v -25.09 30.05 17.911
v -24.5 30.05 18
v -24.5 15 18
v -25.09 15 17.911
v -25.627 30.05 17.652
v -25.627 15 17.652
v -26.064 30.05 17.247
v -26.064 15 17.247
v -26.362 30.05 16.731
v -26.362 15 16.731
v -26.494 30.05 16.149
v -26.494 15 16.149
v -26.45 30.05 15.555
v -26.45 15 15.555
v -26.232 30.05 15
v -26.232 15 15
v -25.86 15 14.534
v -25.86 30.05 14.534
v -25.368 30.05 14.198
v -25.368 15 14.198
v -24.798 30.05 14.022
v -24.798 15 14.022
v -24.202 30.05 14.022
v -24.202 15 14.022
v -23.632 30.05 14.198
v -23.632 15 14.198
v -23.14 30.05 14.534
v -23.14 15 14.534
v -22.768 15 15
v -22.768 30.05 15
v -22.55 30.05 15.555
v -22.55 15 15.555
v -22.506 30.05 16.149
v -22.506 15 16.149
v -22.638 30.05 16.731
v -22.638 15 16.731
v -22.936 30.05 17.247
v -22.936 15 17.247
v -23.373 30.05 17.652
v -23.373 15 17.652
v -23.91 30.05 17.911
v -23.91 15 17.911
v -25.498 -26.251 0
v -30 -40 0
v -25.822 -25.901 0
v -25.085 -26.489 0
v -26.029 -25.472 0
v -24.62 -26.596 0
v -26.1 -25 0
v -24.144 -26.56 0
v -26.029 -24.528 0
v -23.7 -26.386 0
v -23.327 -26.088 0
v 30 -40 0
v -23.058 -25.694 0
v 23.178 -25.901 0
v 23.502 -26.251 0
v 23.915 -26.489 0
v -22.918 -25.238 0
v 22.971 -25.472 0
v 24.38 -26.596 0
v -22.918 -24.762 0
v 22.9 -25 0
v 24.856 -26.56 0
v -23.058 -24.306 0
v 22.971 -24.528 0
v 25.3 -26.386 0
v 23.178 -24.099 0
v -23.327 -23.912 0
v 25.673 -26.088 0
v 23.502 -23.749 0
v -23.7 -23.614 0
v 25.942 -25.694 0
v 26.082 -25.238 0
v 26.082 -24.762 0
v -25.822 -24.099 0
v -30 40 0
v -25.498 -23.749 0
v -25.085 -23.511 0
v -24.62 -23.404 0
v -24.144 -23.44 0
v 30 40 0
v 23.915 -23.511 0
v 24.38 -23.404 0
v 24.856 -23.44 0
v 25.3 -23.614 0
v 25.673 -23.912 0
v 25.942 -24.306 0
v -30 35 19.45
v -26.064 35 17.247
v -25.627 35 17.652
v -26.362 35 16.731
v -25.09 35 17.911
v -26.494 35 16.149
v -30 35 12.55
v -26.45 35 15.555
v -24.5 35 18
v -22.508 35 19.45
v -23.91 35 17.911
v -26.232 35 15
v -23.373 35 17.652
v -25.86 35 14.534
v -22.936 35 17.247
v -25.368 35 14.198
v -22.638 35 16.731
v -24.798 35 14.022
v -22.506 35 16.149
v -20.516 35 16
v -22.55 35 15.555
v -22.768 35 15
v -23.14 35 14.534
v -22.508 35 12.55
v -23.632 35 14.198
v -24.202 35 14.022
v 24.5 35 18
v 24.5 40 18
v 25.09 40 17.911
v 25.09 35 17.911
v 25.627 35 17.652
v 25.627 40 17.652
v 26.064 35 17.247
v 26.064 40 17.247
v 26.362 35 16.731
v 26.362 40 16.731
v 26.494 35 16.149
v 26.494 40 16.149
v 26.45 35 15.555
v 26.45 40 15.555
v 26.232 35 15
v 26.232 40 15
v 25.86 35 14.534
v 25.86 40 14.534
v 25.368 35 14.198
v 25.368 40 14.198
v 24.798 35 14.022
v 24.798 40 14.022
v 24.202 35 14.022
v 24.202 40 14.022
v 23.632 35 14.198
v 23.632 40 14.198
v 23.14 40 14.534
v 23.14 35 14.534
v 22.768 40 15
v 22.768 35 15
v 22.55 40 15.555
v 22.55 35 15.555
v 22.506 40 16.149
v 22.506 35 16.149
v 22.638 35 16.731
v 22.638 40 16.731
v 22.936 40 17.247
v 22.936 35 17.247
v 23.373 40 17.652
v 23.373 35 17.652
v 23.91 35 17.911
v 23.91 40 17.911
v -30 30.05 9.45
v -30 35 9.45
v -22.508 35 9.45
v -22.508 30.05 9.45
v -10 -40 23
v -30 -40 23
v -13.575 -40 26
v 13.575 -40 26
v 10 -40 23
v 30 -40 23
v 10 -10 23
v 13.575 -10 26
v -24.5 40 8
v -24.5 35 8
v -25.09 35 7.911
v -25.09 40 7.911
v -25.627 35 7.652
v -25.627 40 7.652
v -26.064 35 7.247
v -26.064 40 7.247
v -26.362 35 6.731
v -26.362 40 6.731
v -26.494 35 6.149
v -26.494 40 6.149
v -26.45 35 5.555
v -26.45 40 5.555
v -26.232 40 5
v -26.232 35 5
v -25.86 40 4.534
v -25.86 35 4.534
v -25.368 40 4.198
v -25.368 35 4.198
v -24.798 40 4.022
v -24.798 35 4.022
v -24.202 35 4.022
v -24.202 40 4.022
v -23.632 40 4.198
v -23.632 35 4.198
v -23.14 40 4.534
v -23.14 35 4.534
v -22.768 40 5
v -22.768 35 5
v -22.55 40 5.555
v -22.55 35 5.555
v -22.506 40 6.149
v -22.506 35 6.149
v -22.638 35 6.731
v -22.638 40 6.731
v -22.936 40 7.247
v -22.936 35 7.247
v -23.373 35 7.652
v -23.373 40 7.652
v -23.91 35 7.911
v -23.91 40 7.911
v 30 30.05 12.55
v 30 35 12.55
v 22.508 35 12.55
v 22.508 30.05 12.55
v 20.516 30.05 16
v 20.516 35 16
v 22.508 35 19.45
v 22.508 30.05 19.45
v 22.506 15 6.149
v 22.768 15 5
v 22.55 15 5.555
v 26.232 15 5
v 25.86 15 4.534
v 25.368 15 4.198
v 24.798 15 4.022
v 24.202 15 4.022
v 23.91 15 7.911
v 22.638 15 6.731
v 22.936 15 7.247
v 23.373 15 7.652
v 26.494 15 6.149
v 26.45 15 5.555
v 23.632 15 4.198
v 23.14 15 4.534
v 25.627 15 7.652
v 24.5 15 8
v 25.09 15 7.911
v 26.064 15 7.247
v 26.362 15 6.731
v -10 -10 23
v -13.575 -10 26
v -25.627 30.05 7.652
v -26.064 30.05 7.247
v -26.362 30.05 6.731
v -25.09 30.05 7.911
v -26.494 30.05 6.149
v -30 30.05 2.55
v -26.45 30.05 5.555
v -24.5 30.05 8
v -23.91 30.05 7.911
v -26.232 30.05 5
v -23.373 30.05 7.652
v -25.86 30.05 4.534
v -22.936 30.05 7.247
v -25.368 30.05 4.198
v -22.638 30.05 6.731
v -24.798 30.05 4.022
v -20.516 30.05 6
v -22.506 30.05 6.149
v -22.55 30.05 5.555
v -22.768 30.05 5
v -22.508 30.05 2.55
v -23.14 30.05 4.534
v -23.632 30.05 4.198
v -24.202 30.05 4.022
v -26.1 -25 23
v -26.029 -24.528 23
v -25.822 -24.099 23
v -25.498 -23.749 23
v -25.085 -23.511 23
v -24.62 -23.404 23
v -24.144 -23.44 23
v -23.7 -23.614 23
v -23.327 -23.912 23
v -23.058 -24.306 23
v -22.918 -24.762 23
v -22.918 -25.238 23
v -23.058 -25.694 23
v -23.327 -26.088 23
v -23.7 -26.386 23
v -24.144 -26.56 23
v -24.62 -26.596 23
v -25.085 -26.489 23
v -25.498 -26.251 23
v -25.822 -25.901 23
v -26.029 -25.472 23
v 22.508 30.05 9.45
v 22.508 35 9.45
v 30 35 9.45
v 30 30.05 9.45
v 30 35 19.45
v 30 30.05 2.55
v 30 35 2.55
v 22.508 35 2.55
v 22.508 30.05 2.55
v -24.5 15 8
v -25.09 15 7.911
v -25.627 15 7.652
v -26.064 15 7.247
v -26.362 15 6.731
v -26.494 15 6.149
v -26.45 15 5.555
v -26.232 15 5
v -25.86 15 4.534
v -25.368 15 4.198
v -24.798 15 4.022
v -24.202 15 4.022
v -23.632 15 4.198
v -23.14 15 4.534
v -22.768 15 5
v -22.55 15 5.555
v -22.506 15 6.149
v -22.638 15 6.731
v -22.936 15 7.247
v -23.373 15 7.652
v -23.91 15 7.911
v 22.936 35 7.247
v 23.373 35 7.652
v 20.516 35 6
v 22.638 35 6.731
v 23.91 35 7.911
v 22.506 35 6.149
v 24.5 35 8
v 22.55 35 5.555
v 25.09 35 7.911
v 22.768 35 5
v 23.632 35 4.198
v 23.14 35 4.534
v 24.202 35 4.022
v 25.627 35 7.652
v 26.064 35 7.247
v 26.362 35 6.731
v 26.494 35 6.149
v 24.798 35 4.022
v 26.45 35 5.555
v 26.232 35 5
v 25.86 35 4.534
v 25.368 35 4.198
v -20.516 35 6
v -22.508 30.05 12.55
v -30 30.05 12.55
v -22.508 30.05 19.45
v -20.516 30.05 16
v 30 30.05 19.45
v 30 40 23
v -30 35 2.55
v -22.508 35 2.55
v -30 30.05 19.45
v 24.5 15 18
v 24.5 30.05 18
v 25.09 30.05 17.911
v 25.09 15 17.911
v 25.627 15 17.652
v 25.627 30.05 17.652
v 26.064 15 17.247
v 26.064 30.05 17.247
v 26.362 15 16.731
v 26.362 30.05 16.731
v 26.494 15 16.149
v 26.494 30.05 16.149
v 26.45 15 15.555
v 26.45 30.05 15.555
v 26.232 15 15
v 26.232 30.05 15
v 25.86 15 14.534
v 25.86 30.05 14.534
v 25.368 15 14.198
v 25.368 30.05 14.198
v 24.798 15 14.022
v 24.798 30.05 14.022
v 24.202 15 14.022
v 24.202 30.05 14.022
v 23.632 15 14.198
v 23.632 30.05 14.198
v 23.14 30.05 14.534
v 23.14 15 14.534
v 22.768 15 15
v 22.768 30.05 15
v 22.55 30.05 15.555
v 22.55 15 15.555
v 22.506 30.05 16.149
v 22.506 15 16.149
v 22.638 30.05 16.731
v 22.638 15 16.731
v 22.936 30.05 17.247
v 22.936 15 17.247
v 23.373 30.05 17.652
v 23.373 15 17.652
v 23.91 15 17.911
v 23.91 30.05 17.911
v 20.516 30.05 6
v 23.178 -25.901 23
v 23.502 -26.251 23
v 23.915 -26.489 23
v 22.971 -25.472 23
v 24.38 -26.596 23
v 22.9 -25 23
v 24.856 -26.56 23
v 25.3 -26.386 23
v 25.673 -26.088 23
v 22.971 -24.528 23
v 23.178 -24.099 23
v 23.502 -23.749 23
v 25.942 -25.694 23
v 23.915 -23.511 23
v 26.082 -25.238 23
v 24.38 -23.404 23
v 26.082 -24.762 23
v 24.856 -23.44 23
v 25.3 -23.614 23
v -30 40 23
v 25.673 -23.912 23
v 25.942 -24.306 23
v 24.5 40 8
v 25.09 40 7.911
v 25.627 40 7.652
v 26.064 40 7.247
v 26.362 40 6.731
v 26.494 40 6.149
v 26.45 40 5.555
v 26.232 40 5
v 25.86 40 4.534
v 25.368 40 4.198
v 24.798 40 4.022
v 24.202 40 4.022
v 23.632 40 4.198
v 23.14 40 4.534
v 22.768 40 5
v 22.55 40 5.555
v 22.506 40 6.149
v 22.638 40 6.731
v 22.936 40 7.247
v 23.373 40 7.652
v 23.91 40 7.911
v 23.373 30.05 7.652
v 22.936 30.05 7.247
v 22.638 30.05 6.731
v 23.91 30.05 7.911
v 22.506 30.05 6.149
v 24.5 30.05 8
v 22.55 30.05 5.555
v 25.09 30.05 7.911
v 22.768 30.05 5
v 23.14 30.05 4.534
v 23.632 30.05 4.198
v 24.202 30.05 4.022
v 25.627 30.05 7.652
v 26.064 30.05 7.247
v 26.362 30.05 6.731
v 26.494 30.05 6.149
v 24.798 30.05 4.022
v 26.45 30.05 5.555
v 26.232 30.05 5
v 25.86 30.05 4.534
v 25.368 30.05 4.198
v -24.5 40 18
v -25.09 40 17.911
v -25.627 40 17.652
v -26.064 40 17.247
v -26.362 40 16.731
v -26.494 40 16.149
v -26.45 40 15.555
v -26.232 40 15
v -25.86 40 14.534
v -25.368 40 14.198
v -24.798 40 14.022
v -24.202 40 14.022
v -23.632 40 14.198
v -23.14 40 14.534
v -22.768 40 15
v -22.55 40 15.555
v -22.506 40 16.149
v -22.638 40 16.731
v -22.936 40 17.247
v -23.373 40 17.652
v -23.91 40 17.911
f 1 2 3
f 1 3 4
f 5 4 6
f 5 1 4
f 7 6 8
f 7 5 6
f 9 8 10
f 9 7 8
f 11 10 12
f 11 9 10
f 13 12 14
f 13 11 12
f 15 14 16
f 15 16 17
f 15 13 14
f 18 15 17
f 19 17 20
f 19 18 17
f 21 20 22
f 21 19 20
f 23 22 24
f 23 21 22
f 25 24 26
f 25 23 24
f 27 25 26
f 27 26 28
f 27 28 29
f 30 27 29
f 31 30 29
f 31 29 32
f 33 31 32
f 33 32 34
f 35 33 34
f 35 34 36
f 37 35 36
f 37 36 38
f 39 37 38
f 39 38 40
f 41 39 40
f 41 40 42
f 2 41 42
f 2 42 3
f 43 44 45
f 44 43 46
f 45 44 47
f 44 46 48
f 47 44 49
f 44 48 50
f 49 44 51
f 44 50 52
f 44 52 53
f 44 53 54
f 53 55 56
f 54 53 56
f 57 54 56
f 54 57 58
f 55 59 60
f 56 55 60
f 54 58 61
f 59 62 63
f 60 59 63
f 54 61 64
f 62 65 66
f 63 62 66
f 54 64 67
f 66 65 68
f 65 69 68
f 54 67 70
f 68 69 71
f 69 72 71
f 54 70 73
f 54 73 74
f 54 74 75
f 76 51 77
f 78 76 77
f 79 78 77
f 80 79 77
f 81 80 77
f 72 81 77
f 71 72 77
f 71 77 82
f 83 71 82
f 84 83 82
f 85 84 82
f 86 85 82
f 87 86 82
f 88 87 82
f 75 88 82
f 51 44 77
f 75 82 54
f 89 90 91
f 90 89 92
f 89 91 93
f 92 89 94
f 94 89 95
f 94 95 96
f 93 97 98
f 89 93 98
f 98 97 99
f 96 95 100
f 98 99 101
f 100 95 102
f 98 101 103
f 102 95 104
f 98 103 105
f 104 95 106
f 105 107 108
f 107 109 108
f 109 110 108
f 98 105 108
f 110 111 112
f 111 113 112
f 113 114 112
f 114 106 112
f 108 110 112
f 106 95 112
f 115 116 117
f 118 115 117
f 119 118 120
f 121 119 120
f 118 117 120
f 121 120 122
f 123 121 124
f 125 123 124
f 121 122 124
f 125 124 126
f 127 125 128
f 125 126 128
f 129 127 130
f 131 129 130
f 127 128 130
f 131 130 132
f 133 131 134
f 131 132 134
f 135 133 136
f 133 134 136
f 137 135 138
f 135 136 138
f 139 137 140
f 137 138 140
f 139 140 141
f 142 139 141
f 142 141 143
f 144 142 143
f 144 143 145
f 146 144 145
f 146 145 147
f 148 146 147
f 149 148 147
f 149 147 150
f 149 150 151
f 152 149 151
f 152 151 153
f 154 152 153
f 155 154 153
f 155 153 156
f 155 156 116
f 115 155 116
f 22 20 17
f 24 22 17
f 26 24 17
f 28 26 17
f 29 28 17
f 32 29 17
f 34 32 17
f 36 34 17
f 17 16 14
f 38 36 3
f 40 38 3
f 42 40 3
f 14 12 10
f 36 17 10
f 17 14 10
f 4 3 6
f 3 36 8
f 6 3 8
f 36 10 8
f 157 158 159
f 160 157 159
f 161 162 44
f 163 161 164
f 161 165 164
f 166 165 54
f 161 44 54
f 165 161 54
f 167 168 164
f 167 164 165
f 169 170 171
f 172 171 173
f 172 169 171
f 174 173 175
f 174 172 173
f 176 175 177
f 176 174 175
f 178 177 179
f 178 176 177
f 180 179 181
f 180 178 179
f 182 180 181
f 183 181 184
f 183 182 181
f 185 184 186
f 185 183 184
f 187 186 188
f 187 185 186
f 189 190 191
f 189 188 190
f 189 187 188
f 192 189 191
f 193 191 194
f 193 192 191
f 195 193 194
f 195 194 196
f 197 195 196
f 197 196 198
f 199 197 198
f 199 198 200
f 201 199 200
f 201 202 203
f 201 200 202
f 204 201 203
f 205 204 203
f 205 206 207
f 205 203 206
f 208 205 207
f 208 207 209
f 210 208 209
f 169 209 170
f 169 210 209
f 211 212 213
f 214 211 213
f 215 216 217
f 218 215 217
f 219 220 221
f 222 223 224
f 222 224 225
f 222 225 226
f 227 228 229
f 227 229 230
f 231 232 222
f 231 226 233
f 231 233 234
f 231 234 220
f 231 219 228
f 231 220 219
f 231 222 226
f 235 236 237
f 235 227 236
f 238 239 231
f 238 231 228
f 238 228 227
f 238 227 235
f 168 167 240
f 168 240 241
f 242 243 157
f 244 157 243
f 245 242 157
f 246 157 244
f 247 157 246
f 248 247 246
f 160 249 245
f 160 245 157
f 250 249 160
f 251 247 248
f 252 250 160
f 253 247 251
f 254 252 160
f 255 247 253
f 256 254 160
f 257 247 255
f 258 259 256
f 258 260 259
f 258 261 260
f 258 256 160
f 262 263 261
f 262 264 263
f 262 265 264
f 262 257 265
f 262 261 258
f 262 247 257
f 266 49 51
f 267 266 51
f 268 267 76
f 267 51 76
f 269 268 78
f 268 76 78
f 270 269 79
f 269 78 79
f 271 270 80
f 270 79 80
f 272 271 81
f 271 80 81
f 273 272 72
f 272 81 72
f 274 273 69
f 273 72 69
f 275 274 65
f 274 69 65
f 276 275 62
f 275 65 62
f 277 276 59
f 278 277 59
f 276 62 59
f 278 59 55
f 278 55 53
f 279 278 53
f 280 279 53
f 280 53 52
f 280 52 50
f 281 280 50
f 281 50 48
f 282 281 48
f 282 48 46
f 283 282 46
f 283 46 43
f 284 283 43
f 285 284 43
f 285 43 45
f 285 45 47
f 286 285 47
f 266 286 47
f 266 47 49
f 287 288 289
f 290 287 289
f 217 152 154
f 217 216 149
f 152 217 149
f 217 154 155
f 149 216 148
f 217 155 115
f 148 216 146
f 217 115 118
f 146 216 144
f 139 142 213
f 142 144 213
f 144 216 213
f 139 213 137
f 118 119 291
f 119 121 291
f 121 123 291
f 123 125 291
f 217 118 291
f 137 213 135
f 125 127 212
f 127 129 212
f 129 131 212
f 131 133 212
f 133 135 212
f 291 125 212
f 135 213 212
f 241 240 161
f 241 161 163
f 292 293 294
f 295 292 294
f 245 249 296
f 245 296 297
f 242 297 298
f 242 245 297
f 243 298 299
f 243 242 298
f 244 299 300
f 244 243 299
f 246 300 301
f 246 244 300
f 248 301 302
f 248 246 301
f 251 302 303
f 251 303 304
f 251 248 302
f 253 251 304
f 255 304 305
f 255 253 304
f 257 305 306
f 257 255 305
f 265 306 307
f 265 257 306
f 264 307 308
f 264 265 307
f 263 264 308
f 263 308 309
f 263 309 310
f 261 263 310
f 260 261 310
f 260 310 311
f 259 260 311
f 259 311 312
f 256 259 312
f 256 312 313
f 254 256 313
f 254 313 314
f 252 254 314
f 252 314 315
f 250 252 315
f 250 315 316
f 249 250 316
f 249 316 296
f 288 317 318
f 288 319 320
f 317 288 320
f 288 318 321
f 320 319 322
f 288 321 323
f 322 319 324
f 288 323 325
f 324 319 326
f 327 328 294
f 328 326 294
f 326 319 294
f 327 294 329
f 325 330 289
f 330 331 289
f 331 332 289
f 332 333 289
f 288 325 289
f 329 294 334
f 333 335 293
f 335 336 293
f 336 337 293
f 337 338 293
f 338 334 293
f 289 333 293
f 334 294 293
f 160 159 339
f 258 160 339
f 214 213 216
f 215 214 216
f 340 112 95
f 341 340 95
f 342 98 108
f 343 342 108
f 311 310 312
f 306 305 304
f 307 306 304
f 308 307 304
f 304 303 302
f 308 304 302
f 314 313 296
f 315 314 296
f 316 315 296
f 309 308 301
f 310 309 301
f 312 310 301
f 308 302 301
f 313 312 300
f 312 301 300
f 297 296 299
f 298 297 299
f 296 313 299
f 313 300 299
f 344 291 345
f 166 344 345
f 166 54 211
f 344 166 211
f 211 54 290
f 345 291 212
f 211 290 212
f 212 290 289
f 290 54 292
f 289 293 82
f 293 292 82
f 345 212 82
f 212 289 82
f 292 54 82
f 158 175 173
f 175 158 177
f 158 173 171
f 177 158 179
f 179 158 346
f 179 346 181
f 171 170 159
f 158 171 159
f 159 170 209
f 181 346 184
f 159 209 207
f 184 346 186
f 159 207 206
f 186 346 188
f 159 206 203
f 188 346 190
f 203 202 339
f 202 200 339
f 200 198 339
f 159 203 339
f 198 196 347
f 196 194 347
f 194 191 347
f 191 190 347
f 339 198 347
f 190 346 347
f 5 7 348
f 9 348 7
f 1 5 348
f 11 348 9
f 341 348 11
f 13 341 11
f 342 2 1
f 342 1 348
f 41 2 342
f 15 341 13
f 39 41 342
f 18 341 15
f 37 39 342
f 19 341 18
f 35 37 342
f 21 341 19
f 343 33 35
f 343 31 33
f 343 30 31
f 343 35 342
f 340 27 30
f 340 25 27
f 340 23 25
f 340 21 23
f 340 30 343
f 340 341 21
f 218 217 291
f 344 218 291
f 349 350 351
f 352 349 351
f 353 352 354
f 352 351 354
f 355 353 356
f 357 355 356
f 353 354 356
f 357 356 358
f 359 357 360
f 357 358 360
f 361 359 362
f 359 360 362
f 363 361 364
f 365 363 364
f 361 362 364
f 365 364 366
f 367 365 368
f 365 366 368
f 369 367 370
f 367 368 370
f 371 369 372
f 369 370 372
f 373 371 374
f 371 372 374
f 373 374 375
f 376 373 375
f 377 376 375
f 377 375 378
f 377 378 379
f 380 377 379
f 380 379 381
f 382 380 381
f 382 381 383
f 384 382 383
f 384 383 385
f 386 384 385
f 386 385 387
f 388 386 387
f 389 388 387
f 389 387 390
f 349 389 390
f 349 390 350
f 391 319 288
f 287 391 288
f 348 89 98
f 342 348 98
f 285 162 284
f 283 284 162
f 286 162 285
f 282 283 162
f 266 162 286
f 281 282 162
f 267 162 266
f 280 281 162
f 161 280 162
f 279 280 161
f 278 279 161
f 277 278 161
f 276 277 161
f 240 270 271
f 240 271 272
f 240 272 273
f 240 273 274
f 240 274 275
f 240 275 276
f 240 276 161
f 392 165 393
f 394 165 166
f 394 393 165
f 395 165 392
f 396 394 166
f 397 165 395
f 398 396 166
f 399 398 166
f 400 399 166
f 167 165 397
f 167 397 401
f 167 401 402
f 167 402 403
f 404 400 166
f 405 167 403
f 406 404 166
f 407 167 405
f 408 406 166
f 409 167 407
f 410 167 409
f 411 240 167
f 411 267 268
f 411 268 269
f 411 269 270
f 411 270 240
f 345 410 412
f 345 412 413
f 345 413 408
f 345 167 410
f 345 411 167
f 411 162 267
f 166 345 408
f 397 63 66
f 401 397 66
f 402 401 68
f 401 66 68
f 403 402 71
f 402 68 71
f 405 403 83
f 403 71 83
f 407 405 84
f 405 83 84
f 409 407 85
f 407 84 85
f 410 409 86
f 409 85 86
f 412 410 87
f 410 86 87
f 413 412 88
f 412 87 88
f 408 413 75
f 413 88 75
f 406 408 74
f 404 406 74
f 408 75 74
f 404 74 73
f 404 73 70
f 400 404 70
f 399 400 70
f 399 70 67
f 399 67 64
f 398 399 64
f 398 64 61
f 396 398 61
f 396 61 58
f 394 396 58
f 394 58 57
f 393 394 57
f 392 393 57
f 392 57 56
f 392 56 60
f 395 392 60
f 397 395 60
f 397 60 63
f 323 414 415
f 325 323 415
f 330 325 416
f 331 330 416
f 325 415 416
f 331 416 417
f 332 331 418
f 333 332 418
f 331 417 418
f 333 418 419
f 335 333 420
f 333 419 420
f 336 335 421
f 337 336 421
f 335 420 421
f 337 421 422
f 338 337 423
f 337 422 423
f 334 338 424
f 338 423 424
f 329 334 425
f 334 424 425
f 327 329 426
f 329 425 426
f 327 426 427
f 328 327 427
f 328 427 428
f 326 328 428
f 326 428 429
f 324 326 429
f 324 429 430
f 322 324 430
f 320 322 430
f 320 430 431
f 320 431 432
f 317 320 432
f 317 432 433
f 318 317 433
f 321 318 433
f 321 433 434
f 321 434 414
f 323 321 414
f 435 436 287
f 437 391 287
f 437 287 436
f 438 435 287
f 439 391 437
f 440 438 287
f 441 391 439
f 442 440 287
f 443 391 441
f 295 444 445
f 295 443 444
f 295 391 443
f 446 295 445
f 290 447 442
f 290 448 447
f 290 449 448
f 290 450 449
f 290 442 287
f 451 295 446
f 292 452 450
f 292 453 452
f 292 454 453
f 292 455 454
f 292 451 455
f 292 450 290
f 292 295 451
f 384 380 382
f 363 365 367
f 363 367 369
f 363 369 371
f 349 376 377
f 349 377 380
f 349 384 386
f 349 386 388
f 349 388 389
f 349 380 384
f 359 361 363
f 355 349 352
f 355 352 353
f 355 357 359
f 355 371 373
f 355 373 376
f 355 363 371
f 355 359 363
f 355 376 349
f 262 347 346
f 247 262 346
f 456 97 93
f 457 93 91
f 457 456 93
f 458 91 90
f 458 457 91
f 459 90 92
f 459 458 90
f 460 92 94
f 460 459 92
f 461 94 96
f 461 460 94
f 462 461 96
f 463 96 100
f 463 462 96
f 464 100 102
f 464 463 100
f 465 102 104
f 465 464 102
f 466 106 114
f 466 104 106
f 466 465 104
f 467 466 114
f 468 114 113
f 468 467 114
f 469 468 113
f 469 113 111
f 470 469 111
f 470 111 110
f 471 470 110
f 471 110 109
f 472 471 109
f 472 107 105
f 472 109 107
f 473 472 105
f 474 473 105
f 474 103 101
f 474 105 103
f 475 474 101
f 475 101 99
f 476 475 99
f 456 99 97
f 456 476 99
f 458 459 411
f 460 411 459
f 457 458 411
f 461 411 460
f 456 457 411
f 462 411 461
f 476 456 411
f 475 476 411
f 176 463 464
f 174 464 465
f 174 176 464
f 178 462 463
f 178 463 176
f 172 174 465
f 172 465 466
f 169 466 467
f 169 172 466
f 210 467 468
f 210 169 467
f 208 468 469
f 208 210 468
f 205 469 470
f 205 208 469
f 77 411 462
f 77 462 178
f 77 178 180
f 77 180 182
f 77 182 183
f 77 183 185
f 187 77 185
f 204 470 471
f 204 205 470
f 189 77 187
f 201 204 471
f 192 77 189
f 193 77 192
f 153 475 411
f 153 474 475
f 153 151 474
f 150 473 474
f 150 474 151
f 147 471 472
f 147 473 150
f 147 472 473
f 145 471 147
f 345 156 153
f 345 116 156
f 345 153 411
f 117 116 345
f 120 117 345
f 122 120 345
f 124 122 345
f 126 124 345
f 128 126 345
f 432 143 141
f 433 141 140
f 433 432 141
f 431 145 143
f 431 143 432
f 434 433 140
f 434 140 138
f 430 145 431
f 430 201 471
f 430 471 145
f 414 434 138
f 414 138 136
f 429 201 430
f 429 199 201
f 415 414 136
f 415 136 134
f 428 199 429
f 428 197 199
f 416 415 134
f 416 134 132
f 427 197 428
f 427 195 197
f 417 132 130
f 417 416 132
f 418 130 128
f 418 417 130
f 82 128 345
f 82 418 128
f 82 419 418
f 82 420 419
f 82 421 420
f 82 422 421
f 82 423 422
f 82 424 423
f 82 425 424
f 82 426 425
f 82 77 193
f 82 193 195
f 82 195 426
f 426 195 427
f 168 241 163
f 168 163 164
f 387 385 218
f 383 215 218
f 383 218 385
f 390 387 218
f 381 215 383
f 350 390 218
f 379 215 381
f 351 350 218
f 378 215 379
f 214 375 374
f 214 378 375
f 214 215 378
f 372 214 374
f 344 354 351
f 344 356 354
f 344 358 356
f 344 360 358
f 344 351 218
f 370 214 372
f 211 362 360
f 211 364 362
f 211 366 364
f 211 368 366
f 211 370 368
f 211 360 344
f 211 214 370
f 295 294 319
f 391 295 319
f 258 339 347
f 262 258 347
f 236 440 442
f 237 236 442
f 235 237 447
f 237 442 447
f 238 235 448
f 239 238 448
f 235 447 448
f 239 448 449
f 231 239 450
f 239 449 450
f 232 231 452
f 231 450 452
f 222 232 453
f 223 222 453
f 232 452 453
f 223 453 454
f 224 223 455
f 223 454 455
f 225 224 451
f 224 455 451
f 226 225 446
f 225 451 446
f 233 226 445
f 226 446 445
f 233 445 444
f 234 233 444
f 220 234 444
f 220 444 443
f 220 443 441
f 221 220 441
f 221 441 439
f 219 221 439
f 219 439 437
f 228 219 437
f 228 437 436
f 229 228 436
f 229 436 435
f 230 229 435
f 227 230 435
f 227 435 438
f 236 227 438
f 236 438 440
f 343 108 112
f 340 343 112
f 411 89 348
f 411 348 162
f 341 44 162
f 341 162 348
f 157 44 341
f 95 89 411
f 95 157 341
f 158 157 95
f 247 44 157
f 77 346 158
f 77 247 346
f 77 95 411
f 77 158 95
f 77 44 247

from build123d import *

# Parameters (mm, degrees)
SKETCH_1_W             = 60
SKETCH_1_H             = 80
EXTRUDE_1_DEPTH        = 23
SKETCH_3_R             = 2
CUT_EXTRUDE_2_DEPTH    = 25
EXTRUDE_START          = -50
EXTRUDE_2_DEPTH        = 30
SKETCH_5_R             = 1.6
CUT_EXTRUDE_3_DEPTH    = 57.356011214
CUT_EXTRUDE_START      = -5
SKETCH_7_R             = 2
CUT_EXTRUDE_4_DEPTH    = 4.95
PATTERN_LINEAR_1_COUNT = 2
PATTERN_LINEAR_1_PITCH = 10


with BuildPart() as part:
    # 草图1 → 凸台-拉伸1 (new body)
    with BuildSketch(Plane.XY):
        Rectangle(SKETCH_1_W, SKETCH_1_H)
    extrude(amount=EXTRUDE_1_DEPTH)

    # 草图3 → 切除-拉伸2 (cut)
    with BuildSketch(Plane(origin=(0, 40, 0), x_dir=(1, 0, 0), z_dir=(0, 1, 0))):
        with Locations(Location((24.5, -6, 0), (0, 0, 270))):
            Circle(SKETCH_3_R)
        with Locations(Location((24.5, -16, 0), (0, 0, 270))):
            Circle(SKETCH_3_R)
    cut_extrude_2 = extrude(amount=-CUT_EXTRUDE_2_DEPTH, mode=Mode.SUBTRACT)

    # 镜向1: 切除-拉伸2 across plane
    add(cut_extrude_2.mirror(Plane(origin=(0, 0, 0), x_dir=(0, 0, 1), z_dir=(1, 0, 0))), mode=Mode.SUBTRACT)

    # 草图4 → 凸台-拉伸2 (add)
    with BuildSketch(Plane(origin=(0, 40, 0), x_dir=(1, 0, 0), z_dir=(0, 1, 0)).offset(EXTRUDE_START)):
        Polygon((13.575260778, -26), (10, -23), (0, -23), (0, -26), align=None)
        Polygon((0, -26), (0, -23), (-10, -23), (-13.575260778, -26), align=None)
    extrude(amount=-EXTRUDE_2_DEPTH)

    # 草图5 → 切除-拉伸3 (cut, through all)
    with BuildSketch(Plane(origin=(0, 0, 0), x_dir=(-1, 0, 0), z_dir=(0, 0, -1))):
        with Locations((-24.5, -25)):
            Circle(SKETCH_5_R)
        with Locations((24.5, -25)):
            Circle(SKETCH_5_R)
    extrude(amount=-CUT_EXTRUDE_3_DEPTH, mode=Mode.SUBTRACT)

    # 草图7 → 切除-拉伸4 (cut)
    # profile 1 of 3: a face of its own
    with BuildSketch(Plane(origin=(0, 40, 0), x_dir=(1, 0, 0), z_dir=(0, 1, 0)).offset(CUT_EXTRUDE_START)):
        Polygon((-26.491858429, -9.45), (-22.508141571, -9.45), (-20.516283143, -6), (-22.508141571, -2.55), (-26.491858429, -2.55), (-30, -2.55), (-30, -9.45), align=None)
        with Locations(Location((-24.5, -6, 0), (0, 0, 270))):
            Circle(SKETCH_7_R, mode=Mode.SUBTRACT)
    # profile 2 of 3: a face of its own
    with BuildSketch(Plane(origin=(0, 40, 0), x_dir=(1, 0, 0), z_dir=(0, 1, 0)).offset(CUT_EXTRUDE_START)):
        Polygon((26.491858429, -9.45), (28.483716857, -6), (26.491858429, -2.55), (22.508141571, -2.55), (20.516283143, -6), (22.508141571, -9.45), align=None)
        with Locations(Location((24.5, -6, 0), (0, 0, 270))):
            Circle(SKETCH_7_R, mode=Mode.SUBTRACT)
    # profile 3 of 3: a face of its own
    with BuildSketch(Plane(origin=(0, 40, 0), x_dir=(1, 0, 0), z_dir=(0, 1, 0)).offset(CUT_EXTRUDE_START)):
        Polygon((26.491858429, -9.45), (30, -9.45), (30, -2.55), (26.491858429, -2.55), (28.483716857, -6), align=None)
    cut_extrude_4 = extrude(amount=-CUT_EXTRUDE_4_DEPTH, mode=Mode.SUBTRACT)

    # 阵列(线性)1: 切除-拉伸4 ×2
    with Locations(*[(0, 0, i * PATTERN_LINEAR_1_PITCH) for i in range(1, PATTERN_LINEAR_1_COUNT)]):
        add(cut_extrude_4, mode=Mode.SUBTRACT)


solid = part.part
